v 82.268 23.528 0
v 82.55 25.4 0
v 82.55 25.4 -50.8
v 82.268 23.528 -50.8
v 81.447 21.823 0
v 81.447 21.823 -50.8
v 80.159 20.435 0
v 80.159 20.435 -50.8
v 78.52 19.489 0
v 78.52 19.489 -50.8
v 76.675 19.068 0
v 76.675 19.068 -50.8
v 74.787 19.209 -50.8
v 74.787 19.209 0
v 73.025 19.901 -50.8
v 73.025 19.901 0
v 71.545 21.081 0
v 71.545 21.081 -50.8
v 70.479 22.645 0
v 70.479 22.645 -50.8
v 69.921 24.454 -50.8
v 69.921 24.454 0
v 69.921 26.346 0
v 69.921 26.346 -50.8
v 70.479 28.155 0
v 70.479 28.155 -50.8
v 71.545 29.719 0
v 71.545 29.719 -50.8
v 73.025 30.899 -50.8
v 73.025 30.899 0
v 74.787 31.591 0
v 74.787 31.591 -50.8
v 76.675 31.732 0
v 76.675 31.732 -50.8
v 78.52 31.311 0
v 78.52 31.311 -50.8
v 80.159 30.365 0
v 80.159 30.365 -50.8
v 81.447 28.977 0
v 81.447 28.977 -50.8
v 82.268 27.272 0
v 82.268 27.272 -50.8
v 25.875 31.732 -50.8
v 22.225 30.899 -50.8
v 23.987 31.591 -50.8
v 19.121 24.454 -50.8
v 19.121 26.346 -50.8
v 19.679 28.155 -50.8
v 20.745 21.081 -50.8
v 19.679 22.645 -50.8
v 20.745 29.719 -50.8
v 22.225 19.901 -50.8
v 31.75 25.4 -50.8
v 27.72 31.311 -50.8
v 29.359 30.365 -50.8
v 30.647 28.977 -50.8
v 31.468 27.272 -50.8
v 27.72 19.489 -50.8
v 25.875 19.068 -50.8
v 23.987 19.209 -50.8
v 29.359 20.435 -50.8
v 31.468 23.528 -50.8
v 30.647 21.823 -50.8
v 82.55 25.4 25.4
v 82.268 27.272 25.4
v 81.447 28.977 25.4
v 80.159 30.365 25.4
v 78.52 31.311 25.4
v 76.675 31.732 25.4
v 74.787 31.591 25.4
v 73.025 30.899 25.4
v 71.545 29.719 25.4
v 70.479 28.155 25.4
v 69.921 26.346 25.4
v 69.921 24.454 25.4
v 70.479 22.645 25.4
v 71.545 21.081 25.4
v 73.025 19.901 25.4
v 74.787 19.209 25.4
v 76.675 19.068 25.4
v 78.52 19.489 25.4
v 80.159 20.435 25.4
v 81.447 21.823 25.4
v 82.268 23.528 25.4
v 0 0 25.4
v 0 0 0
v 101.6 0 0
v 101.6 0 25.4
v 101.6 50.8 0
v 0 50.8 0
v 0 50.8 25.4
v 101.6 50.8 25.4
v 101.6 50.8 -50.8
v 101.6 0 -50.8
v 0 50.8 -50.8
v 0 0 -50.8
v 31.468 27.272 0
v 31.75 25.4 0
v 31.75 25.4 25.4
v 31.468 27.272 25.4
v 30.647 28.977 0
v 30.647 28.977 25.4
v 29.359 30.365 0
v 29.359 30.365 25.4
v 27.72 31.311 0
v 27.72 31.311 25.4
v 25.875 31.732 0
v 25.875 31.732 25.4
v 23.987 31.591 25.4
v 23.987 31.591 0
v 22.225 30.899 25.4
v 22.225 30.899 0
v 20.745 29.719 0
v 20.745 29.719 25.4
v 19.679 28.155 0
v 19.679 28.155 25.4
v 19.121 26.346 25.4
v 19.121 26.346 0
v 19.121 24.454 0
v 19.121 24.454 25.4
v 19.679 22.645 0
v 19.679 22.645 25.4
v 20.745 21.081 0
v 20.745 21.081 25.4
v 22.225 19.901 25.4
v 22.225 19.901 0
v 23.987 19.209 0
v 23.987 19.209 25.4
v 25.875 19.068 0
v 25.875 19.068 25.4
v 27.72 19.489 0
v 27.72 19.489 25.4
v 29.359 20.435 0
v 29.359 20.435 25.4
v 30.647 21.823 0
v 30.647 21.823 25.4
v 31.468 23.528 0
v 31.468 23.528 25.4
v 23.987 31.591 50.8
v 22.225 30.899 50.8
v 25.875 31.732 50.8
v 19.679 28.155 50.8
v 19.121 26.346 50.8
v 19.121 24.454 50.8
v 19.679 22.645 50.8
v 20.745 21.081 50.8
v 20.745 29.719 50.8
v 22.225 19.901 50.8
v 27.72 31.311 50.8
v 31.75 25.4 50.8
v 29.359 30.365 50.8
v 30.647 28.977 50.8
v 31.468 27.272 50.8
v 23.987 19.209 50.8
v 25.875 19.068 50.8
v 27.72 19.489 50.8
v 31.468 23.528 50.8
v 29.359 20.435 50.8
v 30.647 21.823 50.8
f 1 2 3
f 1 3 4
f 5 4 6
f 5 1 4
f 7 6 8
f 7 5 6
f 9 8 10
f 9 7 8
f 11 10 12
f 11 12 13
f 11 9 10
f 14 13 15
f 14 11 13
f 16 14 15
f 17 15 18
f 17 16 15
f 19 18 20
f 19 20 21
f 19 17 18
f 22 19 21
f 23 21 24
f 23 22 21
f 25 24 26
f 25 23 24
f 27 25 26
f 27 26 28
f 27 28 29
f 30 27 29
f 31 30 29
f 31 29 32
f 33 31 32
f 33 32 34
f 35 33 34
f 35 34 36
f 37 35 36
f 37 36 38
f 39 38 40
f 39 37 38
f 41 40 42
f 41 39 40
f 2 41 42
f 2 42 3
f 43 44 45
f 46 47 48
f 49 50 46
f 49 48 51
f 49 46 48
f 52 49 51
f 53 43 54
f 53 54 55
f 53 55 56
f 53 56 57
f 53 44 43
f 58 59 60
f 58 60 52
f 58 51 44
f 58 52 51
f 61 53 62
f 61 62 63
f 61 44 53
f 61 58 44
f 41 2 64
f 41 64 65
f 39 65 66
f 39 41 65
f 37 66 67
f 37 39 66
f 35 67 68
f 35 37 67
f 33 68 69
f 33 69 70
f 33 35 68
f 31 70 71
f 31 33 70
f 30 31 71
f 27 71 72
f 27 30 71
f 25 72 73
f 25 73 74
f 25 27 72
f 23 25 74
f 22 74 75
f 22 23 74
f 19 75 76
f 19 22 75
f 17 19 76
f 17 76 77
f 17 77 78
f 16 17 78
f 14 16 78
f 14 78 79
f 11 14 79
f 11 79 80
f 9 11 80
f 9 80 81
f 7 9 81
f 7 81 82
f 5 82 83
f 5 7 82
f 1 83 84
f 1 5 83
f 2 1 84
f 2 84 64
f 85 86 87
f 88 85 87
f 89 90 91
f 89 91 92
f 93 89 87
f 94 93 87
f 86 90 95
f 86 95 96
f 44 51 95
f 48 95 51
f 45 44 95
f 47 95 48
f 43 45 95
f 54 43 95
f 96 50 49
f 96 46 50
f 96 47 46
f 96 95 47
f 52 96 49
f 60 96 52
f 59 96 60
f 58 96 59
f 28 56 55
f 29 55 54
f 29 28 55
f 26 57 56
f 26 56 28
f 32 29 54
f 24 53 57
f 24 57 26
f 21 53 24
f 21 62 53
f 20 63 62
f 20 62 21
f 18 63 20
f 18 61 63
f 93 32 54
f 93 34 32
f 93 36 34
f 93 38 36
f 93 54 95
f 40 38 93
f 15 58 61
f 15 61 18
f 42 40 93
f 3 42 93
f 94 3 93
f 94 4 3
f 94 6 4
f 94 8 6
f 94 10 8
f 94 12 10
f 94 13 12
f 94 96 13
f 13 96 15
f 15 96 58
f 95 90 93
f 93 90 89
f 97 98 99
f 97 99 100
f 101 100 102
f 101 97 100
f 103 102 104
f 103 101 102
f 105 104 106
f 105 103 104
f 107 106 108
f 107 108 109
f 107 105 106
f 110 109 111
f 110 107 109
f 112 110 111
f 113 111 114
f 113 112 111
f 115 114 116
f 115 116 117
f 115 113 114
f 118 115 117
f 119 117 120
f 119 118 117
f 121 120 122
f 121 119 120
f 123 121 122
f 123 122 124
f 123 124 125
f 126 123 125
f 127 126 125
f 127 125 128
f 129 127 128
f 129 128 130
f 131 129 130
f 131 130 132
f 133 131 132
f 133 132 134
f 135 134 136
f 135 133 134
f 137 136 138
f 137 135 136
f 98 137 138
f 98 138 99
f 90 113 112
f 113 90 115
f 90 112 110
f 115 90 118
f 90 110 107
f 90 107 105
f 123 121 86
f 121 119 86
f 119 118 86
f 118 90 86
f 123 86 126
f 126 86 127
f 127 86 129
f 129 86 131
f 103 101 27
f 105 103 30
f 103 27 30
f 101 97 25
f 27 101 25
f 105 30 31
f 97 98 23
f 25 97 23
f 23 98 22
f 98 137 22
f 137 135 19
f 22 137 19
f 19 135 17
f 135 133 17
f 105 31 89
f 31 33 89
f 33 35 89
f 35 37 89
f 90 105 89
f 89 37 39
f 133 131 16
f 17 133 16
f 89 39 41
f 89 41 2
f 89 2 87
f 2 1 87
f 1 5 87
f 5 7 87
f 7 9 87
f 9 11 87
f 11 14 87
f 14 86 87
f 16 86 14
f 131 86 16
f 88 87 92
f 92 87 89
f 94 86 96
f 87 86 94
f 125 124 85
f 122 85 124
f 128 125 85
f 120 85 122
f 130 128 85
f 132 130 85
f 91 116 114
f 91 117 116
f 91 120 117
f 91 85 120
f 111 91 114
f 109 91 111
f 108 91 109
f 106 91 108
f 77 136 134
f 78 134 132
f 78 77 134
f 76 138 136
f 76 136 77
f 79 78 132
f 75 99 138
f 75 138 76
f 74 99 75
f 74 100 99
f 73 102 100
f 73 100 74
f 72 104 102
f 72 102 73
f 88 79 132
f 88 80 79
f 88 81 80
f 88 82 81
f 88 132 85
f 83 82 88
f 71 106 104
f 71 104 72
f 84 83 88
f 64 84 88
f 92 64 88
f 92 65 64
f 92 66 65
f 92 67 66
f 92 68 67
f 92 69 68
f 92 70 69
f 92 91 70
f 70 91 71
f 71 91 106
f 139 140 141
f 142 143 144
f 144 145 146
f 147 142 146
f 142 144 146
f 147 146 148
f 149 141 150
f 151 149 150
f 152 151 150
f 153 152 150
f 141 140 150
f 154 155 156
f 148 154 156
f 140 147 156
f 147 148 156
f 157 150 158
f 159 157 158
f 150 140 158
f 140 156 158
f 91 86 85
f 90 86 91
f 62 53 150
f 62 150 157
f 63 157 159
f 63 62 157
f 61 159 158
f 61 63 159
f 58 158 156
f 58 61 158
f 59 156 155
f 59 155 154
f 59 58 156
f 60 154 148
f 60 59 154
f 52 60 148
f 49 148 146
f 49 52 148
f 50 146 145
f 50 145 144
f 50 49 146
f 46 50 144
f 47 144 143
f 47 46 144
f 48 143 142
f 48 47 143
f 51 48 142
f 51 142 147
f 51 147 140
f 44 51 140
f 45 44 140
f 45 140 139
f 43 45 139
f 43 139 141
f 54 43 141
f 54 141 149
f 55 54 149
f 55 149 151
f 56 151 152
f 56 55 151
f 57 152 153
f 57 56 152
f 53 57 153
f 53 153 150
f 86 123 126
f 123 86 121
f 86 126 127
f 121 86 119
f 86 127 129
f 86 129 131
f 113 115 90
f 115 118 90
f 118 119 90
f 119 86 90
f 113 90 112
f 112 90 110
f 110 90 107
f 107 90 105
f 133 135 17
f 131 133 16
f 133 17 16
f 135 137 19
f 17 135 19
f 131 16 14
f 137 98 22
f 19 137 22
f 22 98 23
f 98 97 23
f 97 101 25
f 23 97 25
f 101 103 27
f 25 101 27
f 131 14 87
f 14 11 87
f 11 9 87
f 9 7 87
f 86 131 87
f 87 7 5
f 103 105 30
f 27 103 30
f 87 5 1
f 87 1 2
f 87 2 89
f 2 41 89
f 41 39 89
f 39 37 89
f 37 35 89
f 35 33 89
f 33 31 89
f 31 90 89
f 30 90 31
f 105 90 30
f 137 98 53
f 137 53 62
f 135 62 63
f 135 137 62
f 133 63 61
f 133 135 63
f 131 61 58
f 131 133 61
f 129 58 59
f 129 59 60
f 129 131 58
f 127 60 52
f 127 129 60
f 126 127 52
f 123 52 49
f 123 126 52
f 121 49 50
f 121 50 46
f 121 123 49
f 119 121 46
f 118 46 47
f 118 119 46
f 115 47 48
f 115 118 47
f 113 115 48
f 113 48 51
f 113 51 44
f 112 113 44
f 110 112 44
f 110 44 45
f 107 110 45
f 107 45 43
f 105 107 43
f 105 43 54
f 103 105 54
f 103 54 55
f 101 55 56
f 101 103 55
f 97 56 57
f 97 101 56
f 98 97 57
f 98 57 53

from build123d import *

# Parameters (mm, degrees)
F0_W      = 101.6
F0_H      = 50.8
F0_R      = 6.35
F1_DEPTH  = 25.4
F1_FACE_W = 101.6
F1_FACE_H = 50.8
F1_FACE_R = 6.35
F2_DEPTH  = 50.8
F3_R      = 6.35
F4_DEPTH  = 101.6


with BuildPart() as f1:
    # F0 (on Top) → F1 (new body)
    with BuildSketch(Plane.XY):
        with Locations((50.8, 25.4)):
            Rectangle(F0_W, F0_H)
        with Locations((25.4, 25.4)):
            Circle(F0_R, mode=Mode.SUBTRACT)
        with Locations((76.2, 25.4)):
            Circle(F0_R, mode=Mode.SUBTRACT)
    extrude(amount=F1_DEPTH)


with BuildPart() as f2:
    # F1_face (on face) → F2 (new body)
    with BuildSketch(Plane(origin=(50.8, 25.4, 0), x_dir=(1, 0, 0), z_dir=(0, 0, -1))):
        Rectangle(F1_FACE_W, F1_FACE_H)
        with Locations((-25.4, 0)):
            Circle(F1_FACE_R, mode=Mode.SUBTRACT)
        with Locations((25.4, 0)):
            Circle(F1_FACE_R, mode=Mode.SUBTRACT)
    extrude(amount=F2_DEPTH)


with BuildPart() as f4:
    # F3 (on face) → F4 (new body)
    with BuildSketch(Plane(origin=(0, 0, -50.8), x_dir=(1, 0, 0), z_dir=(0, 0, -1))):
        with Locations((25.4, -25.4)):
            Circle(F3_R)
    extrude(amount=-F4_DEPTH)


solid = Compound([f1.part, f2.part, f4.part])
